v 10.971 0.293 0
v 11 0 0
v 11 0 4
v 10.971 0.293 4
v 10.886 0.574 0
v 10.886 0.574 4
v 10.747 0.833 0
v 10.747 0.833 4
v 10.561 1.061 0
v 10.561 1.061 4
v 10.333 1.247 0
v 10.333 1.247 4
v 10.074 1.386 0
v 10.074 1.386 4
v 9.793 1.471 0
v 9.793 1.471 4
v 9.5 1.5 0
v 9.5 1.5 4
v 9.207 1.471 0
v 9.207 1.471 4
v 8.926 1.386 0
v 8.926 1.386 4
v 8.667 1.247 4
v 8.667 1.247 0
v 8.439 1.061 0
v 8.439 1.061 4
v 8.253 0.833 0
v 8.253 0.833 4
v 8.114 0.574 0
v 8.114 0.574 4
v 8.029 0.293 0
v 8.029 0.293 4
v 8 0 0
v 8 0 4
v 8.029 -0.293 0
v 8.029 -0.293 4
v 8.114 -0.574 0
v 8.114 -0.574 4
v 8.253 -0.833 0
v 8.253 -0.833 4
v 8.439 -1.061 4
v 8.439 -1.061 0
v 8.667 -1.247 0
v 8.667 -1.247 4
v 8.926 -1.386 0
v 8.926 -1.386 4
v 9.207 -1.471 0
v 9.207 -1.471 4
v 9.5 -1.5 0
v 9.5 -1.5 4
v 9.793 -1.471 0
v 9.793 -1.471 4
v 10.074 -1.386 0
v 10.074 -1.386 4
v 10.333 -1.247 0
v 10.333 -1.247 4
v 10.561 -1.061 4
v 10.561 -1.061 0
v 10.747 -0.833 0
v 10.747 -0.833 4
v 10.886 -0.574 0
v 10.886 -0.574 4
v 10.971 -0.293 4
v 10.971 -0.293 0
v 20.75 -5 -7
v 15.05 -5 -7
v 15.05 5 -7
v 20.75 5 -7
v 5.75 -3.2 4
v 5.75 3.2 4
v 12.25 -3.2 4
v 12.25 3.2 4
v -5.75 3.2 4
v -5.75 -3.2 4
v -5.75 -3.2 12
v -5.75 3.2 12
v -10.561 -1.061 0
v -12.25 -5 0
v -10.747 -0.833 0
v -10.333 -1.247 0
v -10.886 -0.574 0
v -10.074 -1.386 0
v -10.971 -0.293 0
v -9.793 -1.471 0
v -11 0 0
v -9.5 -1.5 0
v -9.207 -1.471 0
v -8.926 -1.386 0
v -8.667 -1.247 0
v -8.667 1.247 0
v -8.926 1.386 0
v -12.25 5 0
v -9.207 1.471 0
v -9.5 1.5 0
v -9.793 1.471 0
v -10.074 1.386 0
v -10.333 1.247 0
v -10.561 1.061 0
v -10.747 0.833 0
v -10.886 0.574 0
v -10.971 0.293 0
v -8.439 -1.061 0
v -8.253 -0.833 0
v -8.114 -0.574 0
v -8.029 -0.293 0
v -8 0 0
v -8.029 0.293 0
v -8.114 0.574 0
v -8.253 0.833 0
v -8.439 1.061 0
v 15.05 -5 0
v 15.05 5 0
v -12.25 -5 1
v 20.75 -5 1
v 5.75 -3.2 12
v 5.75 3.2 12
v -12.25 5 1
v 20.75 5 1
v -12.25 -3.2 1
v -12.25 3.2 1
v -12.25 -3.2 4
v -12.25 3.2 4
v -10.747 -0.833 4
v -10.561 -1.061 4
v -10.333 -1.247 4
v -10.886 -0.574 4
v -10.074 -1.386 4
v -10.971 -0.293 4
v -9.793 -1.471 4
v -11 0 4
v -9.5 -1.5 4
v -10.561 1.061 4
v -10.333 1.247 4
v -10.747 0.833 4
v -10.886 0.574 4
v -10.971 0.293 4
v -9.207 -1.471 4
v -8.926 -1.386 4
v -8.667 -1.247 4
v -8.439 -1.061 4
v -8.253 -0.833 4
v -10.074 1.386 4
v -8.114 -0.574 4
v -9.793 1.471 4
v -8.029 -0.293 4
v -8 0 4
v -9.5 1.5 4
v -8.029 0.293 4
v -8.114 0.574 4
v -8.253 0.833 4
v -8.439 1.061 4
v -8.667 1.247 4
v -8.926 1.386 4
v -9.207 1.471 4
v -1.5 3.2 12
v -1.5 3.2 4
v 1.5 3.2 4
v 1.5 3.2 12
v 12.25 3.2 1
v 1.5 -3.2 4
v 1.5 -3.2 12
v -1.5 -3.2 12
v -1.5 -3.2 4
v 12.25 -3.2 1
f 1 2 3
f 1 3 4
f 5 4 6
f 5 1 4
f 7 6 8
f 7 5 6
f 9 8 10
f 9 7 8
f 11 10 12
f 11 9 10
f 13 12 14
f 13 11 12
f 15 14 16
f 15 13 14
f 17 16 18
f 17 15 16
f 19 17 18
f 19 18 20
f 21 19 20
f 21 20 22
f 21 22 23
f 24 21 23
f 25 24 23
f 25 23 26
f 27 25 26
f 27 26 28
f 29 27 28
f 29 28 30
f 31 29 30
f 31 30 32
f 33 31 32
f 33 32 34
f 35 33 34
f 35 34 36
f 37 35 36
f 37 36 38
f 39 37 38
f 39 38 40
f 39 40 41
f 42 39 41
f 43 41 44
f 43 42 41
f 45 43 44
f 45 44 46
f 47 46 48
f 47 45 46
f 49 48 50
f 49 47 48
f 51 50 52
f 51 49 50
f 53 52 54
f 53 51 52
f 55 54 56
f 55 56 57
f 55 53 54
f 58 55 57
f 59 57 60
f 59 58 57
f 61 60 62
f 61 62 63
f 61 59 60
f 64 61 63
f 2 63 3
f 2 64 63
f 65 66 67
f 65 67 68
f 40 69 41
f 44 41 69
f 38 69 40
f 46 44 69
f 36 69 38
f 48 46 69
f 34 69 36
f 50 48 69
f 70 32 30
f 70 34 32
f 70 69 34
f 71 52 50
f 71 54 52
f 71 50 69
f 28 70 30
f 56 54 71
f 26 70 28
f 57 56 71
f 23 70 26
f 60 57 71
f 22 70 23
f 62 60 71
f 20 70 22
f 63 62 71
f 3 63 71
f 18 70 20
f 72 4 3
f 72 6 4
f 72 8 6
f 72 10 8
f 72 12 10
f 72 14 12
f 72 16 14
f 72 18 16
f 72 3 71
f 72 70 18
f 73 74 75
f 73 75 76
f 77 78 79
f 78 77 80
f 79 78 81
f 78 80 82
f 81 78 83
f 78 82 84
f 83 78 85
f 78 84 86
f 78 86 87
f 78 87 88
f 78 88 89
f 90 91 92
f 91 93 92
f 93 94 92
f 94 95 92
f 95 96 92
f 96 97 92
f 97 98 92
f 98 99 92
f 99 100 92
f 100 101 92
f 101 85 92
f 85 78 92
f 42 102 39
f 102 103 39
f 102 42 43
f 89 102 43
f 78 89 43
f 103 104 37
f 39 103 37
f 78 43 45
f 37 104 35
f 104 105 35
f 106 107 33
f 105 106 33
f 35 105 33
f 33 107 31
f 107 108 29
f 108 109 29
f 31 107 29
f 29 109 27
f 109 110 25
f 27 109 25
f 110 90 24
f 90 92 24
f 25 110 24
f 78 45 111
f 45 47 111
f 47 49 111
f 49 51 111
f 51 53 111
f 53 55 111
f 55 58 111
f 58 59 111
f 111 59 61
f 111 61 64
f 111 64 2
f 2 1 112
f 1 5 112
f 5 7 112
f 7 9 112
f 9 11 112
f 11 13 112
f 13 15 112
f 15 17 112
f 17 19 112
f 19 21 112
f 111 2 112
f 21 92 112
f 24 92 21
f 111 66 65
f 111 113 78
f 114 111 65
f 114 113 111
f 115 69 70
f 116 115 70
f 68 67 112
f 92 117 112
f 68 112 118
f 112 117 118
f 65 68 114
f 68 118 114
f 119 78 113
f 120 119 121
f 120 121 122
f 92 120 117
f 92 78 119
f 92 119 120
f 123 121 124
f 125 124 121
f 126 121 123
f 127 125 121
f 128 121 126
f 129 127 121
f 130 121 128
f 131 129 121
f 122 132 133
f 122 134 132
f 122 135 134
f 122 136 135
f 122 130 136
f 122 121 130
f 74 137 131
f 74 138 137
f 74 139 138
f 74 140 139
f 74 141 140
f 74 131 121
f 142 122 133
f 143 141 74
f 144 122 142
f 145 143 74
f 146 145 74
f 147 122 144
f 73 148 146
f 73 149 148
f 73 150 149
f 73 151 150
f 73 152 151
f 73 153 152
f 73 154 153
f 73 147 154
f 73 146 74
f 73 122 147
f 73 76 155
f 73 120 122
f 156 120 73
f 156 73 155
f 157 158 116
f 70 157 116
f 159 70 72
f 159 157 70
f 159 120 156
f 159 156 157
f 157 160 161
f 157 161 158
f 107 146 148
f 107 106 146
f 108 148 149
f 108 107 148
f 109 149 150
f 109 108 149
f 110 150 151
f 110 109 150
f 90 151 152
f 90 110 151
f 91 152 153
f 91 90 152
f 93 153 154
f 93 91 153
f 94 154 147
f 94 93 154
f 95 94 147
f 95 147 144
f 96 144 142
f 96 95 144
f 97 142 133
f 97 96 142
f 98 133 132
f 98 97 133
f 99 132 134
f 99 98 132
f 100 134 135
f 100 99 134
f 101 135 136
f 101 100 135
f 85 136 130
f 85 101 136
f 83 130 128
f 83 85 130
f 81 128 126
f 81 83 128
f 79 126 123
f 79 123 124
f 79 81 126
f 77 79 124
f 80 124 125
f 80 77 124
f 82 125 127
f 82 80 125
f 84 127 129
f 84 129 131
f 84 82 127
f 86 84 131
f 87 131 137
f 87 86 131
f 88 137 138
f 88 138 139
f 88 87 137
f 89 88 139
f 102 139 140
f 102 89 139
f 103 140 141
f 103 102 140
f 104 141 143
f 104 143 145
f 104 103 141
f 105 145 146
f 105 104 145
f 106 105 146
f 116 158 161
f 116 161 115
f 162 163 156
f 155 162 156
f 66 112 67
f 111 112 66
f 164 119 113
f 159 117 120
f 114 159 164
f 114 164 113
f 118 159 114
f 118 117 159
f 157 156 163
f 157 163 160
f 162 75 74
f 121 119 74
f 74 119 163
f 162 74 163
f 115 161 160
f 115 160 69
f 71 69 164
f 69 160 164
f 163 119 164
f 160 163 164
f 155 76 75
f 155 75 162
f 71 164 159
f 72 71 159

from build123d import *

# Parameters (mm, degrees)
F0_W     = 24.5
F0_H     = 10
F0_R     = 1.5
F0_W_2   = 8.5
F1_DEPTH = 1
F2_W     = 6.5
F2_H     = 6.4
F2_R     = 1.5
F2_W_2   = 3
F3_DEPTH = 3
F2_W_3   = 4.25
F4_DEPTH = 11
F5_W     = 5.7
F5_H     = 10
F6_DEPTH = 7


with BuildPart() as f1:
    # F0 (on Top) → F1 (new body)
    with BuildSketch(Plane.XY):
        Rectangle(F0_W, F0_H)
        with Locations((-9.5, 0)):
            Circle(F0_R, mode=Mode.SUBTRACT)
        with Locations((9.5, 0)):
            Circle(F0_R, mode=Mode.SUBTRACT)
        with Locations((16.5, 0)):
            Rectangle(F0_W_2, F0_H)
    extrude(amount=F1_DEPTH)

    # F2 (on face) → F3 (join)
    with BuildSketch(Plane.XY.offset(1)):
        with Locations((-9, 0)):
            Rectangle(F2_W, F2_H)
        with Locations((-9.5, 0)):
            Circle(F2_R, mode=Mode.SUBTRACT)
        Rectangle(F2_W_2, F2_H)
        with Locations((9, 0)):
            Rectangle(F2_W, F2_H)
        with Locations((9.5, 0)):
            Circle(F2_R, mode=Mode.SUBTRACT)
    extrude(amount=F3_DEPTH)

    # F2 (on face) → F4 (join)
    with BuildSketch(Plane.XY.offset(1)):
        with Locations((-3.625, 0)):
            Rectangle(F2_W_3, F2_H)
        with Locations((3.625, 0)):
            Rectangle(F2_W_3, F2_H)
    extrude(amount=F4_DEPTH)

    # F5 (on face) → F6 (join)
    with BuildSketch(Plane(origin=(0, 0, 0), x_dir=(1, 0, 0), z_dir=(0, 0, -1))):
        with Locations((17.9, 0)):
            Rectangle(F5_W, F5_H)
    extrude(amount=F6_DEPTH)


solid = f1.part
